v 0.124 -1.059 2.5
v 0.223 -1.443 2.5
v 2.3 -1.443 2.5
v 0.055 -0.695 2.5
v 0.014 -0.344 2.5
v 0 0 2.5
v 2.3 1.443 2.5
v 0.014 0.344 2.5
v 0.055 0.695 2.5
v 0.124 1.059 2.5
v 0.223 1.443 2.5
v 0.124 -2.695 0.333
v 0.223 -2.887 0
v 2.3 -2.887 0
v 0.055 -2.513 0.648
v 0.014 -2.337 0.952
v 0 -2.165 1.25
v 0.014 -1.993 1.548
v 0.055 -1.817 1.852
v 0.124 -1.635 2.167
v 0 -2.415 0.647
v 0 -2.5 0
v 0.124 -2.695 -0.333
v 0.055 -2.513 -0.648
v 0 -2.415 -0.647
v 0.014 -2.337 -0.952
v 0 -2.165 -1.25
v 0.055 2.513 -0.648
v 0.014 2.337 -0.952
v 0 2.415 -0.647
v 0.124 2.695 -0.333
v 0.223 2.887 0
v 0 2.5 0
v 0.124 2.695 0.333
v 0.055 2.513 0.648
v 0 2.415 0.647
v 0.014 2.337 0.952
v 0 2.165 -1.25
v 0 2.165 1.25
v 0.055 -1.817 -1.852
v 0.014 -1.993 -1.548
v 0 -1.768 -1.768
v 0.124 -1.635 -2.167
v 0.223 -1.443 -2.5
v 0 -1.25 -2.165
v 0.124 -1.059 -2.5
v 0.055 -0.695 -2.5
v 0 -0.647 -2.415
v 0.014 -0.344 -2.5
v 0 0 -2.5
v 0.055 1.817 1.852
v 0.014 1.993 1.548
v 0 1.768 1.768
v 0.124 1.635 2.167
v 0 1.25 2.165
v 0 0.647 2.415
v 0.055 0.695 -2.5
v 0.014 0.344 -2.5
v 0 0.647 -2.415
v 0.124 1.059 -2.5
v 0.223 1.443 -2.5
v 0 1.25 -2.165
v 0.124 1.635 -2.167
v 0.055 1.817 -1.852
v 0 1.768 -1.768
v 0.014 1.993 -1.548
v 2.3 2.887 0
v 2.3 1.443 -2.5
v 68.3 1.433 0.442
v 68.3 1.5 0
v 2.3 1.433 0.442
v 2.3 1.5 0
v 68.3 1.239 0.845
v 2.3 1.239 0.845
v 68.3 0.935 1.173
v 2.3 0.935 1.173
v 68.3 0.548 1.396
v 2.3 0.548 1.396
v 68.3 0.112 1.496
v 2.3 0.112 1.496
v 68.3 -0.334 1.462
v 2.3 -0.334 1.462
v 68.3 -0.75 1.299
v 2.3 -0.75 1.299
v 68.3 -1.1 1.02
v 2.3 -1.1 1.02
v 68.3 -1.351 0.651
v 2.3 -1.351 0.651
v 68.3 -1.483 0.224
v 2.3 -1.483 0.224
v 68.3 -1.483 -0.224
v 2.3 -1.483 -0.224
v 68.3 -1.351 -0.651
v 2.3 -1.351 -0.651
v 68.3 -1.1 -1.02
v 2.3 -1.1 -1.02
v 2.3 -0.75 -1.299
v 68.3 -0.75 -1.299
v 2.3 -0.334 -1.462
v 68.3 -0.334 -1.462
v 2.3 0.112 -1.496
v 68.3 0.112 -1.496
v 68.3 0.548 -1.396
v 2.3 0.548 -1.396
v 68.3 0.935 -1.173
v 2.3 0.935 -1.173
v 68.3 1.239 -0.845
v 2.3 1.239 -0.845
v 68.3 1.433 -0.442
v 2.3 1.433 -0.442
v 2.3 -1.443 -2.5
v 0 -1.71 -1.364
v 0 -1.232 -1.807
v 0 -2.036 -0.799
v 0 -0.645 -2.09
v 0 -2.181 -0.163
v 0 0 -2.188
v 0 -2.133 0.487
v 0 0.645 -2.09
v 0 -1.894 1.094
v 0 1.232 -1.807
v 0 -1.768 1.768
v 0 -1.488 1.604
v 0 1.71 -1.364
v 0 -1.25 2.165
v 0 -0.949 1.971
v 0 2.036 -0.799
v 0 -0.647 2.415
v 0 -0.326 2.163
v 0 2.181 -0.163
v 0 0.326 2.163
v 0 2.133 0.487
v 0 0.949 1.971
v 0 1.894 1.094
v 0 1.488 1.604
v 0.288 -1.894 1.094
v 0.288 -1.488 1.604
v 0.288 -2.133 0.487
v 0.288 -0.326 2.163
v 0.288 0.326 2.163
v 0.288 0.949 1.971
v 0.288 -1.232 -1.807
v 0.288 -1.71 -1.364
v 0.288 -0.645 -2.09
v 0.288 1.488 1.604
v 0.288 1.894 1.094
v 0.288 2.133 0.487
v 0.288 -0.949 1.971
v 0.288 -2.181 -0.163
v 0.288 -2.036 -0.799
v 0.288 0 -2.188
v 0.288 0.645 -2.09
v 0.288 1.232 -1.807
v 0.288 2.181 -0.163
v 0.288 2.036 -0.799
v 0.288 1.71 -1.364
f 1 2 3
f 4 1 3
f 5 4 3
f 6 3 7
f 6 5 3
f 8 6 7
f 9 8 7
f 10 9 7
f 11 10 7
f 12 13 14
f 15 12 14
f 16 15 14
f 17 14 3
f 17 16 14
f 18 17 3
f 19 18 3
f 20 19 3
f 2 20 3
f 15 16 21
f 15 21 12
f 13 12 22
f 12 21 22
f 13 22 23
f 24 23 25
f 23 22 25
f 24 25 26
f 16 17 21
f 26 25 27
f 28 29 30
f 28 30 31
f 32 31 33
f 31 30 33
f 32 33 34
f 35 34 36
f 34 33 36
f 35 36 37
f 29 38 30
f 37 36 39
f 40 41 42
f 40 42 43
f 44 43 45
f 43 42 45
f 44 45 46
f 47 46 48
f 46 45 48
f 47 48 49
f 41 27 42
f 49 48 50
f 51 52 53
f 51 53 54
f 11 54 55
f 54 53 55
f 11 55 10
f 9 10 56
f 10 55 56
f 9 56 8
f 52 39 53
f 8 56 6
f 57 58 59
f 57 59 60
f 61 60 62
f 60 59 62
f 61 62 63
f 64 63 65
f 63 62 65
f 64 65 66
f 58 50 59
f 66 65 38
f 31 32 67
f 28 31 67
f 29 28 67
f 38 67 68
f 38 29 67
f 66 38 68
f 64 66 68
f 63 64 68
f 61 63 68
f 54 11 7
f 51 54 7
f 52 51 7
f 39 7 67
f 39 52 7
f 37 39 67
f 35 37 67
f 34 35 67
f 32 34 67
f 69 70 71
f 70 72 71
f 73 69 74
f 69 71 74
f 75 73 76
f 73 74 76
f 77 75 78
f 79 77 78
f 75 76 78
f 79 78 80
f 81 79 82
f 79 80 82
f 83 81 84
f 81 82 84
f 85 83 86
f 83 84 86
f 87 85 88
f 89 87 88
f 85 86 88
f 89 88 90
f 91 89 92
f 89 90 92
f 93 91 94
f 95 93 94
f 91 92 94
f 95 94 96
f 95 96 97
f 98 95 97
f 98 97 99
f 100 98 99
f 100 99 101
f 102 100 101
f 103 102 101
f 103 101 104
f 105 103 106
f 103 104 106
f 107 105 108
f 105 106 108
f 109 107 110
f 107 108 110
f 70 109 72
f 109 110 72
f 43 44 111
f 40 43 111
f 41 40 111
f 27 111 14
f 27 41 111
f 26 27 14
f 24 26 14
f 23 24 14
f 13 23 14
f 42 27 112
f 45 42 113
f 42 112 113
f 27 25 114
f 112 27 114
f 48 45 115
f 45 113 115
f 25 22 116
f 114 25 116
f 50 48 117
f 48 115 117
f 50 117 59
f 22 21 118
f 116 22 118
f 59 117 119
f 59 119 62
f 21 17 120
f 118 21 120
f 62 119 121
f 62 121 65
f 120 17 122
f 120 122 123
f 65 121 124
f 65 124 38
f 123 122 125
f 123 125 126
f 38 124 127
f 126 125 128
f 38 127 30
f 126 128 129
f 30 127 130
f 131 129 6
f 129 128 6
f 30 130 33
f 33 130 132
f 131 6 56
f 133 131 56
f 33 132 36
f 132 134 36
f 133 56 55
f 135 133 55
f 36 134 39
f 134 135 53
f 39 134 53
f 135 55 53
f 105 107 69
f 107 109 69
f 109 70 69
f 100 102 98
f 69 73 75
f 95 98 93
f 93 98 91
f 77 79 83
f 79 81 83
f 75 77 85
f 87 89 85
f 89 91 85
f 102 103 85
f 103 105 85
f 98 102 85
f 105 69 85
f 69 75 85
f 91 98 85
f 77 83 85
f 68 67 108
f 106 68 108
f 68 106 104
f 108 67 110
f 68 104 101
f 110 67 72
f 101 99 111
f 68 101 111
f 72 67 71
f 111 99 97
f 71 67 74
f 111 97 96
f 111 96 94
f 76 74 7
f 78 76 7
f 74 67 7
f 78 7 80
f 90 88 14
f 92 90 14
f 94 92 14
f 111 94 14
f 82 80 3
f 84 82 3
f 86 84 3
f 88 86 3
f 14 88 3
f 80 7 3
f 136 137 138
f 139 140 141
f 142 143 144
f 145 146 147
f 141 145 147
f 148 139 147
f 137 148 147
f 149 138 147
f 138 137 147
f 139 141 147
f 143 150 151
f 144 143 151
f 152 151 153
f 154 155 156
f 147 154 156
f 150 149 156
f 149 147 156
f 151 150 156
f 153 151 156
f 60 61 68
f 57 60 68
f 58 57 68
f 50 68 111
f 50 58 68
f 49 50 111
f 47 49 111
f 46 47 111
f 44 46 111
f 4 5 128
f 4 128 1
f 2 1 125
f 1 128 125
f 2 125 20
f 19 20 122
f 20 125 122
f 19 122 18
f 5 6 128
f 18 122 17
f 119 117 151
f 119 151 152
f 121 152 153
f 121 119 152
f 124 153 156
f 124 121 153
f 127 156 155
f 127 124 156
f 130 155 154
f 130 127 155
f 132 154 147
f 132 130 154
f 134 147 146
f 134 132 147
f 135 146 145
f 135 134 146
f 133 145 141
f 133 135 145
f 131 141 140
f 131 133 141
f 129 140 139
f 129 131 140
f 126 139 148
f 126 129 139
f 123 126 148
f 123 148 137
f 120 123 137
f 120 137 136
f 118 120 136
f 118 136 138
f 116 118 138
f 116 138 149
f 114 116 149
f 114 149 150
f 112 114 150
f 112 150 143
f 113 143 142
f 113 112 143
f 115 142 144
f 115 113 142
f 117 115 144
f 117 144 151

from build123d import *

# Parameters (mm, degrees)
SKETCH2_R     = 2.915704388
HEX_DIE_DEPTH = 2.3
SKETCH4_R     = 2.1875
INDENT_DEPTH  = 0.2875


with BuildPart() as part:
    # BodySke → Base-Revolve (revolve)
    with BuildSketch(Plane.XY):
        Polygon((2.3, 1.5), (2.3, 2.886836028), (0.223339885, 2.886836028), (0, 2.5), (0, 0), (68.3, 0), (68.3, 1.5), align=None)
    revolve(axis=Axis((-25.4, 0, 0), (1, 0, 0)))

    # Sketch2 → Hex-Die (cut)
    with BuildSketch(Plane(origin=(0, 0, 0), x_dir=(0, 0, -1), z_dir=(1, 0, 0))):
        Circle(SKETCH2_R)
        Polygon((-2.5, 1.443375679), (0, 2.886751359), (2.5, 1.443375679), (2.5, -1.443375679), (0, -2.886751359), (-2.5, -1.443375679), align=None, mode=Mode.SUBTRACT)
    extrude(amount=HEX_DIE_DEPTH, mode=Mode.SUBTRACT)

    # Sketch4 → Indent (cut)
    with BuildSketch(Plane(origin=(0, 0, 0), x_dir=(0, 0, -1), z_dir=(1, 0, 0))):
        Circle(SKETCH4_R)
    extrude(amount=INDENT_DEPTH, mode=Mode.SUBTRACT)


solid = part.part
